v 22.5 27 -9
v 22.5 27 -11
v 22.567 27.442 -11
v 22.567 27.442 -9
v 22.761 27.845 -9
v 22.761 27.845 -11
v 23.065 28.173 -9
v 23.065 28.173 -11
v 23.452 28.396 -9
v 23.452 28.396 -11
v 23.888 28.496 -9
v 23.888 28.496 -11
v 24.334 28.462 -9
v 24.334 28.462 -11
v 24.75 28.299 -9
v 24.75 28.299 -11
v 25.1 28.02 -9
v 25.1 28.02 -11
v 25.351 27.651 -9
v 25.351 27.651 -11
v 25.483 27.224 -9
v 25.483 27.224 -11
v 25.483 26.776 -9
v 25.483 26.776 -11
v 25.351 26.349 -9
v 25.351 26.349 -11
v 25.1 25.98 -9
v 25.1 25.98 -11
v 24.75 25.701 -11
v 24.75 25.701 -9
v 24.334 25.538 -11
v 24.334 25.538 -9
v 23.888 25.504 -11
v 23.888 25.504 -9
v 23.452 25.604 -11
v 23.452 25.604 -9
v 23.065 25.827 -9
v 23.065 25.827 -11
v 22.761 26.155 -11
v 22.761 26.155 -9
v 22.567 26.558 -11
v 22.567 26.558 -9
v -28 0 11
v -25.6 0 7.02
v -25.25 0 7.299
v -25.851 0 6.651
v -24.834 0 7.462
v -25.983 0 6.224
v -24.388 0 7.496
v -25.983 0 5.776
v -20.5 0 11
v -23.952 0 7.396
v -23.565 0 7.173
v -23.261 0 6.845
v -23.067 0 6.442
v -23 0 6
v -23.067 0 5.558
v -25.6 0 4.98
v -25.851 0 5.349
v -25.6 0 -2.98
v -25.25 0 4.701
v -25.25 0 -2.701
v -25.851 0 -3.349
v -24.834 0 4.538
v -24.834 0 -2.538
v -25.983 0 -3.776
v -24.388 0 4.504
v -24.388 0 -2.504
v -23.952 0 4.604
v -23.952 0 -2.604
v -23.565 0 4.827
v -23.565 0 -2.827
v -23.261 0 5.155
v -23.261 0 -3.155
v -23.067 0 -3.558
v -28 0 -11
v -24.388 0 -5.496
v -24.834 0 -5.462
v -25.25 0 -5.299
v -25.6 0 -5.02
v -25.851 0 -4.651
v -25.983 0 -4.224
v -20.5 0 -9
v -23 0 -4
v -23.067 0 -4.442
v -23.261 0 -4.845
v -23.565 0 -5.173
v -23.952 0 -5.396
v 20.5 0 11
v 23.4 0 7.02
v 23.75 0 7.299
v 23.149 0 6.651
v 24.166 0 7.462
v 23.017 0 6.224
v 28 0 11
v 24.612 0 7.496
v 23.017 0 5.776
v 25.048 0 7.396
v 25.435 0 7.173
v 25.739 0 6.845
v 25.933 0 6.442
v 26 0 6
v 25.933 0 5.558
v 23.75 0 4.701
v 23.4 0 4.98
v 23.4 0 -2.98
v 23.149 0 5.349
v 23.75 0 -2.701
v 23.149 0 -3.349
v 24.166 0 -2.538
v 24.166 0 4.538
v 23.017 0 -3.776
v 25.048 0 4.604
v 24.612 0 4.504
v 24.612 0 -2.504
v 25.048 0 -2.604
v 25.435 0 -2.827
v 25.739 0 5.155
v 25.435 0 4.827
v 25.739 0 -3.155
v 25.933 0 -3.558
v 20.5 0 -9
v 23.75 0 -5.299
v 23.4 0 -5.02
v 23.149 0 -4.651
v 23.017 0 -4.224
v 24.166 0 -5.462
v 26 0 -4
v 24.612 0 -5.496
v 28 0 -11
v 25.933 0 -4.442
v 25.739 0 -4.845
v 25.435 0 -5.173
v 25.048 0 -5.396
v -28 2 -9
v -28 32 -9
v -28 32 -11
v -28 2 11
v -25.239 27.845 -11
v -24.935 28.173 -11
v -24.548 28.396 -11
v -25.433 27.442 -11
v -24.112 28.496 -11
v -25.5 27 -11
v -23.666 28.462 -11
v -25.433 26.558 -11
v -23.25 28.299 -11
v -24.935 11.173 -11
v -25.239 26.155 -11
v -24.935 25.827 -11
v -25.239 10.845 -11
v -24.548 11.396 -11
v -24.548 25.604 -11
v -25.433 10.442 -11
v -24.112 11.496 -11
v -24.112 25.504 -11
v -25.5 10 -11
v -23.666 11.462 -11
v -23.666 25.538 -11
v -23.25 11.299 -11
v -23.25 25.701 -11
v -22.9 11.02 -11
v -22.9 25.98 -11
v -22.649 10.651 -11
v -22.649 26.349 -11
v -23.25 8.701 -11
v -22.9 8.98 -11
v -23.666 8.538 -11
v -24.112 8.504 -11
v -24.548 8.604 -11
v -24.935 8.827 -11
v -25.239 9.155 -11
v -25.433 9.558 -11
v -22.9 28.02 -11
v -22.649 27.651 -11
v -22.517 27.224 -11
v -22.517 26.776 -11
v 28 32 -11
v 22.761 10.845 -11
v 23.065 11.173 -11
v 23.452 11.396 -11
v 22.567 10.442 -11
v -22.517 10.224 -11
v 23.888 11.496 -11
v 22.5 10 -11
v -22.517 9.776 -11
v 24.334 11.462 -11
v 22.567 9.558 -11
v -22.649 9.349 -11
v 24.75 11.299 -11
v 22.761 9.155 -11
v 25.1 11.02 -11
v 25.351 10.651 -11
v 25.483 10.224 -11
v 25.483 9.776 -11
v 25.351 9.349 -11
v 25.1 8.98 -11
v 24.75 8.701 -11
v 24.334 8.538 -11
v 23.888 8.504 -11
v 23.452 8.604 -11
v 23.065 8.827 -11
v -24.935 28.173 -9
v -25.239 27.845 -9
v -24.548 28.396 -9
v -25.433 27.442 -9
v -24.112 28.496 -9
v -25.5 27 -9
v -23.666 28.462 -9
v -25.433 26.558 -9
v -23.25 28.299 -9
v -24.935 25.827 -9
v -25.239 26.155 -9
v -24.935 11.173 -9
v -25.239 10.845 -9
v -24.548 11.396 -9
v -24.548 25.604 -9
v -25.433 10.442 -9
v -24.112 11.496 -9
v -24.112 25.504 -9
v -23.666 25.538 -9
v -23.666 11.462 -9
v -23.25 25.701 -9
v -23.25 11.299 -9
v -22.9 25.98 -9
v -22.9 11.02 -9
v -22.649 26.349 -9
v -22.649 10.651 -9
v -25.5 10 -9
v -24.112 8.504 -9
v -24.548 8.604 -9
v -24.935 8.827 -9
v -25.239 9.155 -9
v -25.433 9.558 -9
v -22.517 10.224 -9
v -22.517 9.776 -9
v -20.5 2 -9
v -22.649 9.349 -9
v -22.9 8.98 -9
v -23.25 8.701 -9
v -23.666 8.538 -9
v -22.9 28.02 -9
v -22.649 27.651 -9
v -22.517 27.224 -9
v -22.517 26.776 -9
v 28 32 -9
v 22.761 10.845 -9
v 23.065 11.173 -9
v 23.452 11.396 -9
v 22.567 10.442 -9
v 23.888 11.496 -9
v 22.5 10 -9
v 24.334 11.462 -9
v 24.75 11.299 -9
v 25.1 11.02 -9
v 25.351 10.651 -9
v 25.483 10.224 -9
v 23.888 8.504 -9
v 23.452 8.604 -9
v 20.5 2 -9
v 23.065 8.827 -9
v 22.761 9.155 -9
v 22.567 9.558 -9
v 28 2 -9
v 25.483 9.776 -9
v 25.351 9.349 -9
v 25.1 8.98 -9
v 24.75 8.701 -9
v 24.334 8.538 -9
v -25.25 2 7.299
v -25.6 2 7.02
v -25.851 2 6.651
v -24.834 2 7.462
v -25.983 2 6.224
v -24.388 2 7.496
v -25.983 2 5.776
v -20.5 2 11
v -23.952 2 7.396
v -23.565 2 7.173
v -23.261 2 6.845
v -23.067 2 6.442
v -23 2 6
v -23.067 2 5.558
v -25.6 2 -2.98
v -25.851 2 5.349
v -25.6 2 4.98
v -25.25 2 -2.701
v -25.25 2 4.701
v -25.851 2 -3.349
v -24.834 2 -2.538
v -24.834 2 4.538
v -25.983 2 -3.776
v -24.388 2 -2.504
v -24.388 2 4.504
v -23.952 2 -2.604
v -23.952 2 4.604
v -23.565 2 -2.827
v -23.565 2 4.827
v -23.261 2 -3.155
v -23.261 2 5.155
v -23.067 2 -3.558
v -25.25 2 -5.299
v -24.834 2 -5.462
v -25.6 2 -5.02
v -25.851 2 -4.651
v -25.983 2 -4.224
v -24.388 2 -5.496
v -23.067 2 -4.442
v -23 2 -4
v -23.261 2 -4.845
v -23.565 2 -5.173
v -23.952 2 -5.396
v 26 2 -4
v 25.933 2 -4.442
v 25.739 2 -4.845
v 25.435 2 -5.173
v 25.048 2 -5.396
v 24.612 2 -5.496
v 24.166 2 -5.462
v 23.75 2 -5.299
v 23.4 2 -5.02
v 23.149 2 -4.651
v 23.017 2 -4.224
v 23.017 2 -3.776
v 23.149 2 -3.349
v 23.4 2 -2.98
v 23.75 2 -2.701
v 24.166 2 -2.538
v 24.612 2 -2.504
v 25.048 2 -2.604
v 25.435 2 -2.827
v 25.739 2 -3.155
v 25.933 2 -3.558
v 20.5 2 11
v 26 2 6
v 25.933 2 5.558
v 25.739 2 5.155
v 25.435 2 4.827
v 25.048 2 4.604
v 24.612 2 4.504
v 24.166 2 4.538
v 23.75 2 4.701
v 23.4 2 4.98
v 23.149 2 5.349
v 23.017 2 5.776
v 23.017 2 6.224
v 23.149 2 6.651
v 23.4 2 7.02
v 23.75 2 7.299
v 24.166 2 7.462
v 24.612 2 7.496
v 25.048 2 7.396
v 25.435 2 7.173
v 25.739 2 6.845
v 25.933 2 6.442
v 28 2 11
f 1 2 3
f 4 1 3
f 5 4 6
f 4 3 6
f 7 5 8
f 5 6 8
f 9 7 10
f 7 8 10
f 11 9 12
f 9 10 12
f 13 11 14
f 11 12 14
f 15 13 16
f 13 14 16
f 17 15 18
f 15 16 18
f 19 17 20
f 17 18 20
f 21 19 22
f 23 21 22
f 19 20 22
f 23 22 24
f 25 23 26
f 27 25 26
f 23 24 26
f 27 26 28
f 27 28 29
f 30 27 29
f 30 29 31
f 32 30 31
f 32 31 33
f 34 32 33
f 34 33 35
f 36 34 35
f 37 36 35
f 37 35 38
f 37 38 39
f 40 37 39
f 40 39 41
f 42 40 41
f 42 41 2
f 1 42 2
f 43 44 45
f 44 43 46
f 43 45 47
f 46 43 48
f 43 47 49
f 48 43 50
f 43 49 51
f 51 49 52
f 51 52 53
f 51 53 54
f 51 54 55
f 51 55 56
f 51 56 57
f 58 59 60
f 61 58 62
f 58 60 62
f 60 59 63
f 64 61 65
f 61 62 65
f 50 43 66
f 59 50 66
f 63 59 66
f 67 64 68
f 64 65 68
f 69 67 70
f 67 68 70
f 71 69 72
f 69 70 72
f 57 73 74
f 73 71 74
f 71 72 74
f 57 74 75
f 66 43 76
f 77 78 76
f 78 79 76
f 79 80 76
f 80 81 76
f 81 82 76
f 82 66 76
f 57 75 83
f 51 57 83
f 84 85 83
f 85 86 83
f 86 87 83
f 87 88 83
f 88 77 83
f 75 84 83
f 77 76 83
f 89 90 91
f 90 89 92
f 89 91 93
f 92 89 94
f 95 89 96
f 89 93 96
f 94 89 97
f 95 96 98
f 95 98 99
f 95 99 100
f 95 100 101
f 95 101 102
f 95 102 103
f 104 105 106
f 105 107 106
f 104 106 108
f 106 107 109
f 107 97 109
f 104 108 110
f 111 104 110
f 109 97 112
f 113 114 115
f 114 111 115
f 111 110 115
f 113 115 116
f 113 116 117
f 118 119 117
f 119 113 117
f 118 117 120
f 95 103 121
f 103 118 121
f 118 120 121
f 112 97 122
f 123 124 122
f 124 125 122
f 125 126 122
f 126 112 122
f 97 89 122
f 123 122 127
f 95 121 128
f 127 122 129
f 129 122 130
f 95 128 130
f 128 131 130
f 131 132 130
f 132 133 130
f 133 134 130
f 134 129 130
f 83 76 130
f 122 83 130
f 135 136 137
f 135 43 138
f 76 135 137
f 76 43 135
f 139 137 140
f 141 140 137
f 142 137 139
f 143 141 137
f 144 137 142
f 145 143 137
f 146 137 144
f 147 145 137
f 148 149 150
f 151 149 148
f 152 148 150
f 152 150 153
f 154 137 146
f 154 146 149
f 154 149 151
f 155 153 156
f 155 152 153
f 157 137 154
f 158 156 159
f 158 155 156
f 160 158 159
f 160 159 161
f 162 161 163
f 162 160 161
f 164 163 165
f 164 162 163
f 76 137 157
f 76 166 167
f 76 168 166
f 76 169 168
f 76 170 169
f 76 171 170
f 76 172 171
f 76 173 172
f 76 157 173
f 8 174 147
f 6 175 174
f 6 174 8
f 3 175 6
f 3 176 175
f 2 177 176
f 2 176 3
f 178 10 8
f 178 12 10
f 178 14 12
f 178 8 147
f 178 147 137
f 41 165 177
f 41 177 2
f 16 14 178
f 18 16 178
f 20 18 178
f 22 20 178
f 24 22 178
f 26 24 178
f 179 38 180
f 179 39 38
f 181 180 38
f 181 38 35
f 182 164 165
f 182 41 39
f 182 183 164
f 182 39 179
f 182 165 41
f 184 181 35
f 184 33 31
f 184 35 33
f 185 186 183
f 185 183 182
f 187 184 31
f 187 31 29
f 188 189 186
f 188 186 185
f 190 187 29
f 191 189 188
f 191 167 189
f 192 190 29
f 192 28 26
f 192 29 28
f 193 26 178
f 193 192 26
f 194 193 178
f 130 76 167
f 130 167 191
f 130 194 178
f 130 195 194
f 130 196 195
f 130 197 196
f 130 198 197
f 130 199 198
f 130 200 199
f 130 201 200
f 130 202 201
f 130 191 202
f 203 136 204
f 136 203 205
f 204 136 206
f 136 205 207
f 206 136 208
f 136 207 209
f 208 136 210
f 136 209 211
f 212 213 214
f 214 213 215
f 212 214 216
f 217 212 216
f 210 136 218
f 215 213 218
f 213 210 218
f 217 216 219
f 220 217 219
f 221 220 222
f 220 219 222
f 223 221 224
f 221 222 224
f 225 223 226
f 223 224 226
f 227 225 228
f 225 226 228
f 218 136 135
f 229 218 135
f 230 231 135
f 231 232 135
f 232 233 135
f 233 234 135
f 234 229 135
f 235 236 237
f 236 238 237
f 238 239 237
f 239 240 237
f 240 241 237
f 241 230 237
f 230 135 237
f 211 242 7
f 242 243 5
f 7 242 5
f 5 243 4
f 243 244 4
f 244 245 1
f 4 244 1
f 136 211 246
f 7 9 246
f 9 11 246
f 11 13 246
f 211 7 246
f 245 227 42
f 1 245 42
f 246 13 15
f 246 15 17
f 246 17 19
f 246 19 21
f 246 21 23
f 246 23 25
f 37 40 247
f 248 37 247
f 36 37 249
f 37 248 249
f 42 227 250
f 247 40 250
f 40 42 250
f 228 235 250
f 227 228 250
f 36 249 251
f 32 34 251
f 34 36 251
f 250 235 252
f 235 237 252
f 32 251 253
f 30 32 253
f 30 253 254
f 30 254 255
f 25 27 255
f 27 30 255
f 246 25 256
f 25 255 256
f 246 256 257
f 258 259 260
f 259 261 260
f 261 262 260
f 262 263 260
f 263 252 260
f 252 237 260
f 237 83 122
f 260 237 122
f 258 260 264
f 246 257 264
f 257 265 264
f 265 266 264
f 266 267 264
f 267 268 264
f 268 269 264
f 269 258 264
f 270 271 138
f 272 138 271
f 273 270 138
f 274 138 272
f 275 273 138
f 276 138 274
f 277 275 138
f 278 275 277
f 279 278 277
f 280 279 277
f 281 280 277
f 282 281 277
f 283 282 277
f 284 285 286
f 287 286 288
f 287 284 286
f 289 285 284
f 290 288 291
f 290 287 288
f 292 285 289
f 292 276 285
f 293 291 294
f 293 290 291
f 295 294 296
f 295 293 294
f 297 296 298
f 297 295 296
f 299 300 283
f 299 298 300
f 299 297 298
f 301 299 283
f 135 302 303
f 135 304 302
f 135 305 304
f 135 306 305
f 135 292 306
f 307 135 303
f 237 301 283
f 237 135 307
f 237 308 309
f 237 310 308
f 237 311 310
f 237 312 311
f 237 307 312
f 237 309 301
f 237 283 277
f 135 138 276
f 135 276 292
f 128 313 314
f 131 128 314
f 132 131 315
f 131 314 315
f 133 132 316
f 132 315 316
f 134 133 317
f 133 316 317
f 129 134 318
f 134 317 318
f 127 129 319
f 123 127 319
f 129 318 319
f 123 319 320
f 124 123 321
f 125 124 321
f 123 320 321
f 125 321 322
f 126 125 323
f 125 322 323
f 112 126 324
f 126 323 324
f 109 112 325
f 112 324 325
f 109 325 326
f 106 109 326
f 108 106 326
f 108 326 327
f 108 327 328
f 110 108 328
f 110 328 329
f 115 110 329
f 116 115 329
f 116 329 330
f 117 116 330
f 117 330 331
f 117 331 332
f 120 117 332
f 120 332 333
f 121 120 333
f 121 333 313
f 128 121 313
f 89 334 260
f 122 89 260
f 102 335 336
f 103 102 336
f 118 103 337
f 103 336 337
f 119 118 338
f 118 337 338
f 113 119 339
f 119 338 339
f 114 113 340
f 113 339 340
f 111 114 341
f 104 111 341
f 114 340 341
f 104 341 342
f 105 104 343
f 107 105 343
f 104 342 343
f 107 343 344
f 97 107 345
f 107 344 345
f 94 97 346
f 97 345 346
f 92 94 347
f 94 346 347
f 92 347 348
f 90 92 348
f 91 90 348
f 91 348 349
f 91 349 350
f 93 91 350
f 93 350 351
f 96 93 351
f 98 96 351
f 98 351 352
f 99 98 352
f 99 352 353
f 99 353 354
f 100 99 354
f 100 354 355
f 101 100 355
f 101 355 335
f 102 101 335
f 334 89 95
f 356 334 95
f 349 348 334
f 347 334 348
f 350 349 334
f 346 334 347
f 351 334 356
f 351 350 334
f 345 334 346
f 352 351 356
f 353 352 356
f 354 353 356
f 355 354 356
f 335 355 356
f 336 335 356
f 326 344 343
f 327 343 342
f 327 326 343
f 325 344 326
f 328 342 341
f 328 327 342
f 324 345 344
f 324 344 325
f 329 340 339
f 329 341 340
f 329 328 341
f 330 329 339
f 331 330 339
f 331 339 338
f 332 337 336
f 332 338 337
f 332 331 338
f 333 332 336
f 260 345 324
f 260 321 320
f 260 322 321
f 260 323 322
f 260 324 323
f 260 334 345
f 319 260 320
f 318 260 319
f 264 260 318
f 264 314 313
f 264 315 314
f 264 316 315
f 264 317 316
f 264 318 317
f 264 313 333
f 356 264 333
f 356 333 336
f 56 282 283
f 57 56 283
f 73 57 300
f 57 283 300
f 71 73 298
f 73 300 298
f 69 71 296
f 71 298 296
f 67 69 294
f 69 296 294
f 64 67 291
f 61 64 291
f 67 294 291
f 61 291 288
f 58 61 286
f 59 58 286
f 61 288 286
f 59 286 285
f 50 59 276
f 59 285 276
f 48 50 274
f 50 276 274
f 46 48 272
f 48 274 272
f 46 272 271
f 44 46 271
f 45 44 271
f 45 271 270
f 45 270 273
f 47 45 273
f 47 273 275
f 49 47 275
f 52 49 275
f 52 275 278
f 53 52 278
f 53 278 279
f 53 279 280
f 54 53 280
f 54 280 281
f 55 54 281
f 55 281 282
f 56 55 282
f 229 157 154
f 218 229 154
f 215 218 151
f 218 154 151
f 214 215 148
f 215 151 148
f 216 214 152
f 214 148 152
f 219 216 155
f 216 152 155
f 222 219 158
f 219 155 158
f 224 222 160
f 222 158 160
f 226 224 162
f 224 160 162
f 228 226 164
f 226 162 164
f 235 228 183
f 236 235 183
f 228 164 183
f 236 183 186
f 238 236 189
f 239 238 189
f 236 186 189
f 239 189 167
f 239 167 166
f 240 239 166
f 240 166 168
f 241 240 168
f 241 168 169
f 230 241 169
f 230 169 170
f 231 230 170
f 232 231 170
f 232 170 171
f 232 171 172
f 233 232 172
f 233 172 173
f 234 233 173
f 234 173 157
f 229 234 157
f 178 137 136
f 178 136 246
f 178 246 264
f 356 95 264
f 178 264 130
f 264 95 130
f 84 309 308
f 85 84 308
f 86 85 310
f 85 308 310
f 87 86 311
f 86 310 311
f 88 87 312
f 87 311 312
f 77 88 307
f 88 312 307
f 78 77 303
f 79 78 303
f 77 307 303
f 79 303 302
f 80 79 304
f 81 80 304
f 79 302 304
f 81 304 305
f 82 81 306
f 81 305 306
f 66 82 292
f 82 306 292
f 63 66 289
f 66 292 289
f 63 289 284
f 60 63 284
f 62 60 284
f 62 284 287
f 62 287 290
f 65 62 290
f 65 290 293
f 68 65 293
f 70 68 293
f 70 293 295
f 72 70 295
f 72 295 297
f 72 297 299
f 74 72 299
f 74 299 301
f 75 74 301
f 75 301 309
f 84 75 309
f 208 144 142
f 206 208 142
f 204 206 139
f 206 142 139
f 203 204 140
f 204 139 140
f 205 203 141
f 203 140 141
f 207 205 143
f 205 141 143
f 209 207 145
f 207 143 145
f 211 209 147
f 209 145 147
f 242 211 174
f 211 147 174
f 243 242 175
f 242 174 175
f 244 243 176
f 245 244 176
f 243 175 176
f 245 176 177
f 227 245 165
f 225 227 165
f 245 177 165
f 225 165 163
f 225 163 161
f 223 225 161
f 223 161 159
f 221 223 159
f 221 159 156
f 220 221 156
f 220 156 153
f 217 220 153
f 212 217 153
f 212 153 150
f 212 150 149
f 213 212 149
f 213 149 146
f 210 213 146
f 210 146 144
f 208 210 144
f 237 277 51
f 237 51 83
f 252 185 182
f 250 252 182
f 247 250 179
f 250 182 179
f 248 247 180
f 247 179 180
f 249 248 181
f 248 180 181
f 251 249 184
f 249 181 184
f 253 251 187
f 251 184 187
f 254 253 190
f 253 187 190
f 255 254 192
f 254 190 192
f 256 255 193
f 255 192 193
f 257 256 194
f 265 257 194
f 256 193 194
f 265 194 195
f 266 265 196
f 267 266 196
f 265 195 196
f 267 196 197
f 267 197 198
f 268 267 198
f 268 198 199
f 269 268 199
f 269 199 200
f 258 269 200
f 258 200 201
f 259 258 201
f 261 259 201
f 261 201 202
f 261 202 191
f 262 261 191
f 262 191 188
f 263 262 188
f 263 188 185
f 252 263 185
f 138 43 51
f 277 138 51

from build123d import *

# Parameters (mm, degrees)
ESQUISSE1_W             = 56
ESQUISSE1_H             = 22
BOSS_EXTRU_1_DEPTH      = 2
ESQUISSE2_W             = 56
ESQUISSE2_H             = 2
BOSS_EXTRU_2_DEPTH      = 30
ESQUISSE3_W             = 41
ESQUISSE3_H             = 20
ENL_V_MAT_EXTRU_1_DEPTH = 20
ESQUISSE5_R             = 1.5
ENL_V_MAT_EXTRU_2_DEPTH = 20
ESQUISSE6_R             = 1.5
ENL_V_MAT_EXTRU_3_DEPTH = 20


with BuildPart() as part:
    # Esquisse1 → Boss.-Extru.1 (new body)
    with BuildSketch(Plane(origin=(0, 0, 0), x_dir=(1, 0, 0), z_dir=(0, 1, 0))):
        Rectangle(ESQUISSE1_W, ESQUISSE1_H)
    extrude(amount=BOSS_EXTRU_1_DEPTH)

    # Esquisse2 → Boss.-Extru.2 (add)
    with BuildSketch(Plane(origin=(0, 2, 0), x_dir=(1, 0, 0), z_dir=(0, 1, 0))):
        with Locations((0, 10)):
            Rectangle(ESQUISSE2_W, ESQUISSE2_H)
    extrude(amount=BOSS_EXTRU_2_DEPTH)

    # Esquisse3 → Enlèv. mat.-Extru.1 (cut)
    with BuildSketch(Plane(origin=(0, 2, 0), x_dir=(1, 0, 0), z_dir=(0, 1, 0))):
        with Locations((0, -1)):
            Rectangle(ESQUISSE3_W, ESQUISSE3_H)
    extrude(amount=-ENL_V_MAT_EXTRU_1_DEPTH, mode=Mode.SUBTRACT)

    # Esquisse5 → Enlèv. mat.-Extru.2 (cut)
    with BuildSketch(Plane(origin=(0, 2, 0), x_dir=(1, 0, 0), z_dir=(0, 1, 0))):
        with Locations((-24.5, 4)):
            Circle(ESQUISSE5_R)
        with Locations((-24.5, -6)):
            Circle(ESQUISSE5_R)
        with Locations((24.5, 4)):
            Circle(ESQUISSE5_R)
        with Locations((24.5, -6)):
            Circle(ESQUISSE5_R)
    extrude(amount=-ENL_V_MAT_EXTRU_2_DEPTH, mode=Mode.SUBTRACT)

    # Esquisse6 → Enlèv. mat.-Extru.3 (cut)
    with BuildSketch(Plane(origin=(0, 0, -11), x_dir=(-1, 0, 0), z_dir=(0, 0, -1))):
        with Locations((-24, 27)):
            Circle(ESQUISSE6_R)
        with Locations((-24, 10)):
            Circle(ESQUISSE6_R)
        with Locations((24, 10)):
            Circle(ESQUISSE6_R)
        with Locations((24, 27)):
            Circle(ESQUISSE6_R)
    extrude(amount=-ENL_V_MAT_EXTRU_3_DEPTH, mode=Mode.SUBTRACT)


solid = part.part
